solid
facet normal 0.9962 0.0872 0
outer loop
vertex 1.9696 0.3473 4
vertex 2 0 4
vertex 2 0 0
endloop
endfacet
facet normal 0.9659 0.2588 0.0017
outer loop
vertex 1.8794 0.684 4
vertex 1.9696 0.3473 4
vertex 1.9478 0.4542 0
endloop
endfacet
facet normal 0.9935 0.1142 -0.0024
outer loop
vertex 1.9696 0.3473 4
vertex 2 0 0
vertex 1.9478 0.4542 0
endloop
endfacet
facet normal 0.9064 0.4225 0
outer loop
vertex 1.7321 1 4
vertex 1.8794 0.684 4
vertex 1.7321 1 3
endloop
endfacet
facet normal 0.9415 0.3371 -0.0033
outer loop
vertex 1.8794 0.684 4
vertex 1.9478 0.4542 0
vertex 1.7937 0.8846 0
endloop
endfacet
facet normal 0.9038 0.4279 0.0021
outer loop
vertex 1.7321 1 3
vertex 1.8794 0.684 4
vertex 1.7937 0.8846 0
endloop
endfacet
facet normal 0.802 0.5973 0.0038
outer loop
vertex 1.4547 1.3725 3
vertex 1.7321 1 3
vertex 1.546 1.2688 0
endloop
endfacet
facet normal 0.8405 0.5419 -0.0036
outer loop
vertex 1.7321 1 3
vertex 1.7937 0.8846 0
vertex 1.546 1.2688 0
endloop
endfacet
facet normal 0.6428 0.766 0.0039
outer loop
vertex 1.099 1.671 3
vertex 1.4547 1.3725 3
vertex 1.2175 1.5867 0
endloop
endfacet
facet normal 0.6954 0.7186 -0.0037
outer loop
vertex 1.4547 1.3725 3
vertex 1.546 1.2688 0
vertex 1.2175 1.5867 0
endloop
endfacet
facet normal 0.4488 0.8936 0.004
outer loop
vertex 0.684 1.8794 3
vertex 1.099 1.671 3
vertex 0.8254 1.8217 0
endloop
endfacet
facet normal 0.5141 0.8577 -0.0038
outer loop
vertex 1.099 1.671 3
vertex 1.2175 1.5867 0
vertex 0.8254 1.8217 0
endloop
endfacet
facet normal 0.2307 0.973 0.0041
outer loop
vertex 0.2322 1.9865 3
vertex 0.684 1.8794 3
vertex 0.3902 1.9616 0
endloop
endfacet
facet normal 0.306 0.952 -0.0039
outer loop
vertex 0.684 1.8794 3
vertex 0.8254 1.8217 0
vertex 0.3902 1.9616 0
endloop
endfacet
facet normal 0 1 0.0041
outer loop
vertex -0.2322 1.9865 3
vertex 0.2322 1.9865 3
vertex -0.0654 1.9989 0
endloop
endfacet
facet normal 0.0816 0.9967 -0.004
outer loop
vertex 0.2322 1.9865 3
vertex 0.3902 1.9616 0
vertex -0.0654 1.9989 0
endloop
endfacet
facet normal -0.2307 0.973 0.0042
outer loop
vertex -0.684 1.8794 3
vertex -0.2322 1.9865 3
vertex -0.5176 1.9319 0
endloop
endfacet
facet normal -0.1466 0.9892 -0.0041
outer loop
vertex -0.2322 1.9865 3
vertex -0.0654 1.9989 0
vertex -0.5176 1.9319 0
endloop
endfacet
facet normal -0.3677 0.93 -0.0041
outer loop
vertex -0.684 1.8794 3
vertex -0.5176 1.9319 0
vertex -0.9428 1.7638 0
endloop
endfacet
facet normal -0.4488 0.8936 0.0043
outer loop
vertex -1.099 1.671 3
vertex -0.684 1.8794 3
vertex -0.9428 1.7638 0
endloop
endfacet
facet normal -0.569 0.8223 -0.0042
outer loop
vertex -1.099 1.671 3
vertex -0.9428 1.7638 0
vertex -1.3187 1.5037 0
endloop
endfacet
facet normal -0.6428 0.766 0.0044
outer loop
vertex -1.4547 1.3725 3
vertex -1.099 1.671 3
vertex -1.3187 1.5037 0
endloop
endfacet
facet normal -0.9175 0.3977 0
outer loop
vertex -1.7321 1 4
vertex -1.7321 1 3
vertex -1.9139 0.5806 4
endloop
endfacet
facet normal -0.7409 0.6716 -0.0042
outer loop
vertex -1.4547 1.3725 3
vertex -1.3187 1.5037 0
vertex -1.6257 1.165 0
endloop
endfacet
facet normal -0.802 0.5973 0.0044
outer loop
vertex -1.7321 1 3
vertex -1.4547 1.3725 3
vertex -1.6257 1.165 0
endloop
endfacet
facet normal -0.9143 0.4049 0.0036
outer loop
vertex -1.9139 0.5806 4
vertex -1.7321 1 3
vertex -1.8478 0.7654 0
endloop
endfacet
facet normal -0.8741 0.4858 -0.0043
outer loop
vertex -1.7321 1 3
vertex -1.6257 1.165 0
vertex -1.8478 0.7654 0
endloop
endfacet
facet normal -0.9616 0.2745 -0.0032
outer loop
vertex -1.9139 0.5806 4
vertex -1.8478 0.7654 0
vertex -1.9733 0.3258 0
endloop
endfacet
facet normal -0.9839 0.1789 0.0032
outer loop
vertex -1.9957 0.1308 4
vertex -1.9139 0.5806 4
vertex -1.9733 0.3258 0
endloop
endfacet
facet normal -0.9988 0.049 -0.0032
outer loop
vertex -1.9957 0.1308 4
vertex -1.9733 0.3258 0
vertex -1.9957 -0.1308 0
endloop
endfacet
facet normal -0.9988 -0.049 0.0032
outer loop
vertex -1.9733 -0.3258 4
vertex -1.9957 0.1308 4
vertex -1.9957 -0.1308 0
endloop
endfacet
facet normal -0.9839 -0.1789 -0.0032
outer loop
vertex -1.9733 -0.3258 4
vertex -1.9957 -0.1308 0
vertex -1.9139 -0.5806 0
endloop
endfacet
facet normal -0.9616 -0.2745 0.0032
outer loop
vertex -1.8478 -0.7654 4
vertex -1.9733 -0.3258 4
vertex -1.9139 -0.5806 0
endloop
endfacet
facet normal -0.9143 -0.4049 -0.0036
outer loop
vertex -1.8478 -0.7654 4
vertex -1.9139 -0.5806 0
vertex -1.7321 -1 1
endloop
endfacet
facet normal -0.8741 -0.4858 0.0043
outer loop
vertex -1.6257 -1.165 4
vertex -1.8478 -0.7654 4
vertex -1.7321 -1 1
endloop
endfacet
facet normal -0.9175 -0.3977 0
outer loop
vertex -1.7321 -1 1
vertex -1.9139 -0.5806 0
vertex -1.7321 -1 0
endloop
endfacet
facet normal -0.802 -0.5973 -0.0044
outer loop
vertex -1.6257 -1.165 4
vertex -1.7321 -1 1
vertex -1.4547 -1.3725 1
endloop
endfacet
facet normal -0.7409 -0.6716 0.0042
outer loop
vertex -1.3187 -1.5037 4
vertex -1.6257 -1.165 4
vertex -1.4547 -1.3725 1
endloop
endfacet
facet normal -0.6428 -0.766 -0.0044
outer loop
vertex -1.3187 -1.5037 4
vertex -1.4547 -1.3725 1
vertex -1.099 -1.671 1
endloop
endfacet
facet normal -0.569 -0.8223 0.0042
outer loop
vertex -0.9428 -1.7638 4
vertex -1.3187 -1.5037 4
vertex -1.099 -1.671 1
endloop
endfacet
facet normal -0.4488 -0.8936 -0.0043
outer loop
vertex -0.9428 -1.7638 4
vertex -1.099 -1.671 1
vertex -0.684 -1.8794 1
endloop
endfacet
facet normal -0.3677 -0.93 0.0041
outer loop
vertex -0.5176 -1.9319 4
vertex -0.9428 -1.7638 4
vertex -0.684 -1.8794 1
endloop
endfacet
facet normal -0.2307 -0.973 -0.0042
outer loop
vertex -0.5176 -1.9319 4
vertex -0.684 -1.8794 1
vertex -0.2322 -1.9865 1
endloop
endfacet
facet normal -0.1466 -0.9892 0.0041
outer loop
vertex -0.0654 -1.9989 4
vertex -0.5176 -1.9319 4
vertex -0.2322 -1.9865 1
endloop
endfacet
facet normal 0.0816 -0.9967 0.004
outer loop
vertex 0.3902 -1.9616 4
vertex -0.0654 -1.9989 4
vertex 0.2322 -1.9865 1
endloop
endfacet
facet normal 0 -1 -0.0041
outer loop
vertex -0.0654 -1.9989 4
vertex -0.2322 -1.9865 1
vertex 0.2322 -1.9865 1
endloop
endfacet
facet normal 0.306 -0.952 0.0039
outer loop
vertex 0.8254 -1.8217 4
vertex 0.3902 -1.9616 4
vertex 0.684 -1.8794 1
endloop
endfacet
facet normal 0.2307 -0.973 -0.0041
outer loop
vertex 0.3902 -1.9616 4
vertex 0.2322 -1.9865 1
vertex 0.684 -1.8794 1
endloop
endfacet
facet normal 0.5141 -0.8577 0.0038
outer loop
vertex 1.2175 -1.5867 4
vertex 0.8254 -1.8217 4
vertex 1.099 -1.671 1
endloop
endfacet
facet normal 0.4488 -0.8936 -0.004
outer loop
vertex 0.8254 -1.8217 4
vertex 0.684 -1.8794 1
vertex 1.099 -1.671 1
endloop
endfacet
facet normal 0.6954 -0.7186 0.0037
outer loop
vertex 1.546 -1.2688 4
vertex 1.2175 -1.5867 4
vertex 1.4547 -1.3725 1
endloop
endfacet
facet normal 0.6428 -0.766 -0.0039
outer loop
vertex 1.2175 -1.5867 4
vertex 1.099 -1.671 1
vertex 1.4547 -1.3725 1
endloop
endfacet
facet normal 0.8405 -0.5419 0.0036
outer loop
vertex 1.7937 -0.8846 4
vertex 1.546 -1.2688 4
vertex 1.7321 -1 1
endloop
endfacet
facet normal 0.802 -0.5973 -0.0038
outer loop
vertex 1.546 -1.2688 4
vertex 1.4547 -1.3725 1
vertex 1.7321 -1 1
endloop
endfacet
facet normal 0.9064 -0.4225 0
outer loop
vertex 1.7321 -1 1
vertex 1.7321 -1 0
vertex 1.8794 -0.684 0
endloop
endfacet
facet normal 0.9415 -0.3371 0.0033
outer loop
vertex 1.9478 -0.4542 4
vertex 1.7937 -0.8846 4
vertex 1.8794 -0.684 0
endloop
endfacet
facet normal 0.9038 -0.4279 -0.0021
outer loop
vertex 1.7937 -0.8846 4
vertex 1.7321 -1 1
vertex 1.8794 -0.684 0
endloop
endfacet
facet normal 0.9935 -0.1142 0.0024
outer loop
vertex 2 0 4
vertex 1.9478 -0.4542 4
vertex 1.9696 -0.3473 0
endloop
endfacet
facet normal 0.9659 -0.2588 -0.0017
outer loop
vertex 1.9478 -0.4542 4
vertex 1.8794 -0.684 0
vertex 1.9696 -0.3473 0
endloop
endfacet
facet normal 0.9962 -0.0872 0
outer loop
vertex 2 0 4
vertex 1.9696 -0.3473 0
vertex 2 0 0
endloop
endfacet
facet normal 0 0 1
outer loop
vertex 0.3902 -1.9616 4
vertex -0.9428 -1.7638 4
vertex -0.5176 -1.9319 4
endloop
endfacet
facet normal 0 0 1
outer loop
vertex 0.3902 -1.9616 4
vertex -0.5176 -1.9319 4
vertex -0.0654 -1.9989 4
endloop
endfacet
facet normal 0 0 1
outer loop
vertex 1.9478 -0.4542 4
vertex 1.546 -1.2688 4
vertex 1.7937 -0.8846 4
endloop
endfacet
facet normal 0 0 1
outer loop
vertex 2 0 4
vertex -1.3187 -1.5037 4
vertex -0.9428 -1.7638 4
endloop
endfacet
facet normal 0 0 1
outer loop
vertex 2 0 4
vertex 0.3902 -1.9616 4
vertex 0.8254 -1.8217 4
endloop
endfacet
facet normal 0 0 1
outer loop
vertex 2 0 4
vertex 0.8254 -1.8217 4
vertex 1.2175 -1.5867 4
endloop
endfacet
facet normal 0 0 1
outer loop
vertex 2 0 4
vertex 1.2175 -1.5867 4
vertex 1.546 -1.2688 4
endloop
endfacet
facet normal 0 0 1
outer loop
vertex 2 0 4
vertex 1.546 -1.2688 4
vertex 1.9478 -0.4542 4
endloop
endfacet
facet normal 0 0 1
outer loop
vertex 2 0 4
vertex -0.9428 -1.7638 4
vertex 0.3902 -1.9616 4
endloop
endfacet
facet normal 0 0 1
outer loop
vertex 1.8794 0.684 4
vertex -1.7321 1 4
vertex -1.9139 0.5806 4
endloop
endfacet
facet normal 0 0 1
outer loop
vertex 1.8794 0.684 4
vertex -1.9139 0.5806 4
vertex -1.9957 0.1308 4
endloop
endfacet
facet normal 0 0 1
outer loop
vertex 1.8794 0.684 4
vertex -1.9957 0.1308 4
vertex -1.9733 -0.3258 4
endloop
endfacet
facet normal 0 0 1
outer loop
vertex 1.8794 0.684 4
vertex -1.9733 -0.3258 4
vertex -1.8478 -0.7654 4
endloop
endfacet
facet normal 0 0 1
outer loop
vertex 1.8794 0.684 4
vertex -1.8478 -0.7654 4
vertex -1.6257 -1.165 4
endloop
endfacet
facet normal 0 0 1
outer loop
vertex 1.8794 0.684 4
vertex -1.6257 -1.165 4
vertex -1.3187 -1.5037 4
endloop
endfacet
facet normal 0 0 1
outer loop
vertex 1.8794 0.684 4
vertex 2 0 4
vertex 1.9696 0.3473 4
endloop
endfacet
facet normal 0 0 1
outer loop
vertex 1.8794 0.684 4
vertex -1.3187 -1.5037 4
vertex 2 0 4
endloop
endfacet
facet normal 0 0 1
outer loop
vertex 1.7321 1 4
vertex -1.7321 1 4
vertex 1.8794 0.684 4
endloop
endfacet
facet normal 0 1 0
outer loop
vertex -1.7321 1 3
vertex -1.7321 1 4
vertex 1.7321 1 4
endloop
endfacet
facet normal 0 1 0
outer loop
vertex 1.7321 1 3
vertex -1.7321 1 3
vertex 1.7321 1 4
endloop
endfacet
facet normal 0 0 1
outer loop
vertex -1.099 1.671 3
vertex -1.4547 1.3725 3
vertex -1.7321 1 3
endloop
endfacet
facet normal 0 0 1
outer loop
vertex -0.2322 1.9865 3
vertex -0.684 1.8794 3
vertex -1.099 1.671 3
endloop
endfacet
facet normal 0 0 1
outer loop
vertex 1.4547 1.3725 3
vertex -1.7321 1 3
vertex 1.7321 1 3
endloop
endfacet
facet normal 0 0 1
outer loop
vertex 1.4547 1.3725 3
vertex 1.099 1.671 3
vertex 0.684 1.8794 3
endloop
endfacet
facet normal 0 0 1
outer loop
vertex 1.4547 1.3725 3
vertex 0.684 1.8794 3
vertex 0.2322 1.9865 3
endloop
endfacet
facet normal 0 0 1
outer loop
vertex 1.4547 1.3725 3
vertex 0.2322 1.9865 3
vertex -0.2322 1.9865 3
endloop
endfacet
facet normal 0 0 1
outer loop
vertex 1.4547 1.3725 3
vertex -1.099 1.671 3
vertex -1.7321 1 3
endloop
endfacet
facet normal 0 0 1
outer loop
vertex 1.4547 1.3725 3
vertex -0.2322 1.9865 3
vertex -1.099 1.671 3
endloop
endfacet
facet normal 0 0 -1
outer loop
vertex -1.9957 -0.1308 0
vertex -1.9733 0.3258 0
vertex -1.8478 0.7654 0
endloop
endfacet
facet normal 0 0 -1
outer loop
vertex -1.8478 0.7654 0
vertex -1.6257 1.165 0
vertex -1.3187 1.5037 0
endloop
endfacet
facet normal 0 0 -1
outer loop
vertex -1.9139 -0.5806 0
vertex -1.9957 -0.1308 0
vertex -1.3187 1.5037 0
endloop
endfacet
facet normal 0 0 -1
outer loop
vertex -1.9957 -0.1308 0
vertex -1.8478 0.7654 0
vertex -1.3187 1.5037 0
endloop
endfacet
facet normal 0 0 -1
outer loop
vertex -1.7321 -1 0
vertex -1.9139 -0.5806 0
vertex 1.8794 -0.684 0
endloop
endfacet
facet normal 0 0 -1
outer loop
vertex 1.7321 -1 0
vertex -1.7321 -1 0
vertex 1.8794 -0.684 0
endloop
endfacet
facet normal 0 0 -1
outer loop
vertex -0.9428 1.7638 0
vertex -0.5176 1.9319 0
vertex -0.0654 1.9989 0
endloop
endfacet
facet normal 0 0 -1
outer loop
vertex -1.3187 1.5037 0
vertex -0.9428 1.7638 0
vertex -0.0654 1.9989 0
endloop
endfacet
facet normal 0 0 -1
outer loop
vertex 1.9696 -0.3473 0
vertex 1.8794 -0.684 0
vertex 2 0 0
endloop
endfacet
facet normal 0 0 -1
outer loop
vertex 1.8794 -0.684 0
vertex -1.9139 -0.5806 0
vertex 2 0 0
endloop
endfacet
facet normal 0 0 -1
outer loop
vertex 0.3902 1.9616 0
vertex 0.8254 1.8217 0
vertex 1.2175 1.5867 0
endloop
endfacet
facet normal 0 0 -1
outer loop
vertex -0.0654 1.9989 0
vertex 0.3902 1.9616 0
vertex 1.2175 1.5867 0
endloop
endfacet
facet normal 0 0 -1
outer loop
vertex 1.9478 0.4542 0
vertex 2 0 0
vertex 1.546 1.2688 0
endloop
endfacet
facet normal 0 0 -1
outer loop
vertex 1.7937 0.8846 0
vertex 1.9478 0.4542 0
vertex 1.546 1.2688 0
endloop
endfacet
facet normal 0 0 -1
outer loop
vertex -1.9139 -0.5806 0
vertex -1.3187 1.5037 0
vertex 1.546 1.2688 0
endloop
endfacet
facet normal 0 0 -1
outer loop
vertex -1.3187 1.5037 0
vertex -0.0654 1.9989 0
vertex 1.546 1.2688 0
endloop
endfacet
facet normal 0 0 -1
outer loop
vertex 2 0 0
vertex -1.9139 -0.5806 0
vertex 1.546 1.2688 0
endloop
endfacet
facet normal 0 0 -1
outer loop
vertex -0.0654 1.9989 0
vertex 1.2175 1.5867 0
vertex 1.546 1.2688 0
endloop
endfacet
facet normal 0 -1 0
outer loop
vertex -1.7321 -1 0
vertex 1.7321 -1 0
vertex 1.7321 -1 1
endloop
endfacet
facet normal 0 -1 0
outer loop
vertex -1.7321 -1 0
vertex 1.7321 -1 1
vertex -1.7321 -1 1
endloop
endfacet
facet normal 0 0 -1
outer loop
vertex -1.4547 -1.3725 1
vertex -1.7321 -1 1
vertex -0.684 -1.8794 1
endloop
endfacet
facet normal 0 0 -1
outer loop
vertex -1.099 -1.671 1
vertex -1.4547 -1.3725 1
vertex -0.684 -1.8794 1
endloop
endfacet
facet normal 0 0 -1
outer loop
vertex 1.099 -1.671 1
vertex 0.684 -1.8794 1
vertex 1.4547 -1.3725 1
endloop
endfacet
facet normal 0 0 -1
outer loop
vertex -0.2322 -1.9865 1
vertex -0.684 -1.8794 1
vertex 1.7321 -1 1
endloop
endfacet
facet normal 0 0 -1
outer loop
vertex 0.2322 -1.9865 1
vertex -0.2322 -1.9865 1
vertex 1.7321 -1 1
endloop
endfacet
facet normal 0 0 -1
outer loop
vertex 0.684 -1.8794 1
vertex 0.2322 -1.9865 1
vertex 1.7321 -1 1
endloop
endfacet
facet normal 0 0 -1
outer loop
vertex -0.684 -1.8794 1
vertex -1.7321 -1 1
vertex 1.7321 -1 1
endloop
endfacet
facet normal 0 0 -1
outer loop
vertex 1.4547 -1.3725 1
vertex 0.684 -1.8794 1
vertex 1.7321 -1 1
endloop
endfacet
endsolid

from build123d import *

# Parameters (mm, degrees)
SKETCH1_R           = 2
BOSS_EXTRUDE1_DEPTH = 4
CUT_EXTRUDE2_DEPTH  = 1
CUT_EXTRUDE3_DEPTH  = 1


with BuildPart() as part:
    # Sketch1 → Boss-Extrude1 (new body)
    with BuildSketch(Plane.XY):
        Circle(SKETCH1_R)
    extrude(amount=BOSS_EXTRUDE1_DEPTH)

    # Sketch2 → Cut-Extrude2 (cut)
    with BuildSketch(Plane.XY.offset(4)):
        with BuildLine():
            Line((-1.732050808, 1), (1.732050808, 1))
            ThreePointArc((1.732050808, 1), (0, 2), (-1.732050808, 1))
        make_face()
    extrude(amount=-CUT_EXTRUDE2_DEPTH, mode=Mode.SUBTRACT)

    # Sketch4 → Cut-Extrude3 (cut)
    with BuildSketch(Plane(origin=(0, 0, 0), x_dir=(-1, 0, 0), z_dir=(0, 0, -1))):
        with BuildLine():
            Line((-1.732050808, -1), (1.732050808, -1))
            ThreePointArc((1.732050808, -1), (0, -2), (-1.732050808, -1))
        make_face()
    extrude(amount=-CUT_EXTRUDE3_DEPTH, mode=Mode.SUBTRACT)


solid = part.part
